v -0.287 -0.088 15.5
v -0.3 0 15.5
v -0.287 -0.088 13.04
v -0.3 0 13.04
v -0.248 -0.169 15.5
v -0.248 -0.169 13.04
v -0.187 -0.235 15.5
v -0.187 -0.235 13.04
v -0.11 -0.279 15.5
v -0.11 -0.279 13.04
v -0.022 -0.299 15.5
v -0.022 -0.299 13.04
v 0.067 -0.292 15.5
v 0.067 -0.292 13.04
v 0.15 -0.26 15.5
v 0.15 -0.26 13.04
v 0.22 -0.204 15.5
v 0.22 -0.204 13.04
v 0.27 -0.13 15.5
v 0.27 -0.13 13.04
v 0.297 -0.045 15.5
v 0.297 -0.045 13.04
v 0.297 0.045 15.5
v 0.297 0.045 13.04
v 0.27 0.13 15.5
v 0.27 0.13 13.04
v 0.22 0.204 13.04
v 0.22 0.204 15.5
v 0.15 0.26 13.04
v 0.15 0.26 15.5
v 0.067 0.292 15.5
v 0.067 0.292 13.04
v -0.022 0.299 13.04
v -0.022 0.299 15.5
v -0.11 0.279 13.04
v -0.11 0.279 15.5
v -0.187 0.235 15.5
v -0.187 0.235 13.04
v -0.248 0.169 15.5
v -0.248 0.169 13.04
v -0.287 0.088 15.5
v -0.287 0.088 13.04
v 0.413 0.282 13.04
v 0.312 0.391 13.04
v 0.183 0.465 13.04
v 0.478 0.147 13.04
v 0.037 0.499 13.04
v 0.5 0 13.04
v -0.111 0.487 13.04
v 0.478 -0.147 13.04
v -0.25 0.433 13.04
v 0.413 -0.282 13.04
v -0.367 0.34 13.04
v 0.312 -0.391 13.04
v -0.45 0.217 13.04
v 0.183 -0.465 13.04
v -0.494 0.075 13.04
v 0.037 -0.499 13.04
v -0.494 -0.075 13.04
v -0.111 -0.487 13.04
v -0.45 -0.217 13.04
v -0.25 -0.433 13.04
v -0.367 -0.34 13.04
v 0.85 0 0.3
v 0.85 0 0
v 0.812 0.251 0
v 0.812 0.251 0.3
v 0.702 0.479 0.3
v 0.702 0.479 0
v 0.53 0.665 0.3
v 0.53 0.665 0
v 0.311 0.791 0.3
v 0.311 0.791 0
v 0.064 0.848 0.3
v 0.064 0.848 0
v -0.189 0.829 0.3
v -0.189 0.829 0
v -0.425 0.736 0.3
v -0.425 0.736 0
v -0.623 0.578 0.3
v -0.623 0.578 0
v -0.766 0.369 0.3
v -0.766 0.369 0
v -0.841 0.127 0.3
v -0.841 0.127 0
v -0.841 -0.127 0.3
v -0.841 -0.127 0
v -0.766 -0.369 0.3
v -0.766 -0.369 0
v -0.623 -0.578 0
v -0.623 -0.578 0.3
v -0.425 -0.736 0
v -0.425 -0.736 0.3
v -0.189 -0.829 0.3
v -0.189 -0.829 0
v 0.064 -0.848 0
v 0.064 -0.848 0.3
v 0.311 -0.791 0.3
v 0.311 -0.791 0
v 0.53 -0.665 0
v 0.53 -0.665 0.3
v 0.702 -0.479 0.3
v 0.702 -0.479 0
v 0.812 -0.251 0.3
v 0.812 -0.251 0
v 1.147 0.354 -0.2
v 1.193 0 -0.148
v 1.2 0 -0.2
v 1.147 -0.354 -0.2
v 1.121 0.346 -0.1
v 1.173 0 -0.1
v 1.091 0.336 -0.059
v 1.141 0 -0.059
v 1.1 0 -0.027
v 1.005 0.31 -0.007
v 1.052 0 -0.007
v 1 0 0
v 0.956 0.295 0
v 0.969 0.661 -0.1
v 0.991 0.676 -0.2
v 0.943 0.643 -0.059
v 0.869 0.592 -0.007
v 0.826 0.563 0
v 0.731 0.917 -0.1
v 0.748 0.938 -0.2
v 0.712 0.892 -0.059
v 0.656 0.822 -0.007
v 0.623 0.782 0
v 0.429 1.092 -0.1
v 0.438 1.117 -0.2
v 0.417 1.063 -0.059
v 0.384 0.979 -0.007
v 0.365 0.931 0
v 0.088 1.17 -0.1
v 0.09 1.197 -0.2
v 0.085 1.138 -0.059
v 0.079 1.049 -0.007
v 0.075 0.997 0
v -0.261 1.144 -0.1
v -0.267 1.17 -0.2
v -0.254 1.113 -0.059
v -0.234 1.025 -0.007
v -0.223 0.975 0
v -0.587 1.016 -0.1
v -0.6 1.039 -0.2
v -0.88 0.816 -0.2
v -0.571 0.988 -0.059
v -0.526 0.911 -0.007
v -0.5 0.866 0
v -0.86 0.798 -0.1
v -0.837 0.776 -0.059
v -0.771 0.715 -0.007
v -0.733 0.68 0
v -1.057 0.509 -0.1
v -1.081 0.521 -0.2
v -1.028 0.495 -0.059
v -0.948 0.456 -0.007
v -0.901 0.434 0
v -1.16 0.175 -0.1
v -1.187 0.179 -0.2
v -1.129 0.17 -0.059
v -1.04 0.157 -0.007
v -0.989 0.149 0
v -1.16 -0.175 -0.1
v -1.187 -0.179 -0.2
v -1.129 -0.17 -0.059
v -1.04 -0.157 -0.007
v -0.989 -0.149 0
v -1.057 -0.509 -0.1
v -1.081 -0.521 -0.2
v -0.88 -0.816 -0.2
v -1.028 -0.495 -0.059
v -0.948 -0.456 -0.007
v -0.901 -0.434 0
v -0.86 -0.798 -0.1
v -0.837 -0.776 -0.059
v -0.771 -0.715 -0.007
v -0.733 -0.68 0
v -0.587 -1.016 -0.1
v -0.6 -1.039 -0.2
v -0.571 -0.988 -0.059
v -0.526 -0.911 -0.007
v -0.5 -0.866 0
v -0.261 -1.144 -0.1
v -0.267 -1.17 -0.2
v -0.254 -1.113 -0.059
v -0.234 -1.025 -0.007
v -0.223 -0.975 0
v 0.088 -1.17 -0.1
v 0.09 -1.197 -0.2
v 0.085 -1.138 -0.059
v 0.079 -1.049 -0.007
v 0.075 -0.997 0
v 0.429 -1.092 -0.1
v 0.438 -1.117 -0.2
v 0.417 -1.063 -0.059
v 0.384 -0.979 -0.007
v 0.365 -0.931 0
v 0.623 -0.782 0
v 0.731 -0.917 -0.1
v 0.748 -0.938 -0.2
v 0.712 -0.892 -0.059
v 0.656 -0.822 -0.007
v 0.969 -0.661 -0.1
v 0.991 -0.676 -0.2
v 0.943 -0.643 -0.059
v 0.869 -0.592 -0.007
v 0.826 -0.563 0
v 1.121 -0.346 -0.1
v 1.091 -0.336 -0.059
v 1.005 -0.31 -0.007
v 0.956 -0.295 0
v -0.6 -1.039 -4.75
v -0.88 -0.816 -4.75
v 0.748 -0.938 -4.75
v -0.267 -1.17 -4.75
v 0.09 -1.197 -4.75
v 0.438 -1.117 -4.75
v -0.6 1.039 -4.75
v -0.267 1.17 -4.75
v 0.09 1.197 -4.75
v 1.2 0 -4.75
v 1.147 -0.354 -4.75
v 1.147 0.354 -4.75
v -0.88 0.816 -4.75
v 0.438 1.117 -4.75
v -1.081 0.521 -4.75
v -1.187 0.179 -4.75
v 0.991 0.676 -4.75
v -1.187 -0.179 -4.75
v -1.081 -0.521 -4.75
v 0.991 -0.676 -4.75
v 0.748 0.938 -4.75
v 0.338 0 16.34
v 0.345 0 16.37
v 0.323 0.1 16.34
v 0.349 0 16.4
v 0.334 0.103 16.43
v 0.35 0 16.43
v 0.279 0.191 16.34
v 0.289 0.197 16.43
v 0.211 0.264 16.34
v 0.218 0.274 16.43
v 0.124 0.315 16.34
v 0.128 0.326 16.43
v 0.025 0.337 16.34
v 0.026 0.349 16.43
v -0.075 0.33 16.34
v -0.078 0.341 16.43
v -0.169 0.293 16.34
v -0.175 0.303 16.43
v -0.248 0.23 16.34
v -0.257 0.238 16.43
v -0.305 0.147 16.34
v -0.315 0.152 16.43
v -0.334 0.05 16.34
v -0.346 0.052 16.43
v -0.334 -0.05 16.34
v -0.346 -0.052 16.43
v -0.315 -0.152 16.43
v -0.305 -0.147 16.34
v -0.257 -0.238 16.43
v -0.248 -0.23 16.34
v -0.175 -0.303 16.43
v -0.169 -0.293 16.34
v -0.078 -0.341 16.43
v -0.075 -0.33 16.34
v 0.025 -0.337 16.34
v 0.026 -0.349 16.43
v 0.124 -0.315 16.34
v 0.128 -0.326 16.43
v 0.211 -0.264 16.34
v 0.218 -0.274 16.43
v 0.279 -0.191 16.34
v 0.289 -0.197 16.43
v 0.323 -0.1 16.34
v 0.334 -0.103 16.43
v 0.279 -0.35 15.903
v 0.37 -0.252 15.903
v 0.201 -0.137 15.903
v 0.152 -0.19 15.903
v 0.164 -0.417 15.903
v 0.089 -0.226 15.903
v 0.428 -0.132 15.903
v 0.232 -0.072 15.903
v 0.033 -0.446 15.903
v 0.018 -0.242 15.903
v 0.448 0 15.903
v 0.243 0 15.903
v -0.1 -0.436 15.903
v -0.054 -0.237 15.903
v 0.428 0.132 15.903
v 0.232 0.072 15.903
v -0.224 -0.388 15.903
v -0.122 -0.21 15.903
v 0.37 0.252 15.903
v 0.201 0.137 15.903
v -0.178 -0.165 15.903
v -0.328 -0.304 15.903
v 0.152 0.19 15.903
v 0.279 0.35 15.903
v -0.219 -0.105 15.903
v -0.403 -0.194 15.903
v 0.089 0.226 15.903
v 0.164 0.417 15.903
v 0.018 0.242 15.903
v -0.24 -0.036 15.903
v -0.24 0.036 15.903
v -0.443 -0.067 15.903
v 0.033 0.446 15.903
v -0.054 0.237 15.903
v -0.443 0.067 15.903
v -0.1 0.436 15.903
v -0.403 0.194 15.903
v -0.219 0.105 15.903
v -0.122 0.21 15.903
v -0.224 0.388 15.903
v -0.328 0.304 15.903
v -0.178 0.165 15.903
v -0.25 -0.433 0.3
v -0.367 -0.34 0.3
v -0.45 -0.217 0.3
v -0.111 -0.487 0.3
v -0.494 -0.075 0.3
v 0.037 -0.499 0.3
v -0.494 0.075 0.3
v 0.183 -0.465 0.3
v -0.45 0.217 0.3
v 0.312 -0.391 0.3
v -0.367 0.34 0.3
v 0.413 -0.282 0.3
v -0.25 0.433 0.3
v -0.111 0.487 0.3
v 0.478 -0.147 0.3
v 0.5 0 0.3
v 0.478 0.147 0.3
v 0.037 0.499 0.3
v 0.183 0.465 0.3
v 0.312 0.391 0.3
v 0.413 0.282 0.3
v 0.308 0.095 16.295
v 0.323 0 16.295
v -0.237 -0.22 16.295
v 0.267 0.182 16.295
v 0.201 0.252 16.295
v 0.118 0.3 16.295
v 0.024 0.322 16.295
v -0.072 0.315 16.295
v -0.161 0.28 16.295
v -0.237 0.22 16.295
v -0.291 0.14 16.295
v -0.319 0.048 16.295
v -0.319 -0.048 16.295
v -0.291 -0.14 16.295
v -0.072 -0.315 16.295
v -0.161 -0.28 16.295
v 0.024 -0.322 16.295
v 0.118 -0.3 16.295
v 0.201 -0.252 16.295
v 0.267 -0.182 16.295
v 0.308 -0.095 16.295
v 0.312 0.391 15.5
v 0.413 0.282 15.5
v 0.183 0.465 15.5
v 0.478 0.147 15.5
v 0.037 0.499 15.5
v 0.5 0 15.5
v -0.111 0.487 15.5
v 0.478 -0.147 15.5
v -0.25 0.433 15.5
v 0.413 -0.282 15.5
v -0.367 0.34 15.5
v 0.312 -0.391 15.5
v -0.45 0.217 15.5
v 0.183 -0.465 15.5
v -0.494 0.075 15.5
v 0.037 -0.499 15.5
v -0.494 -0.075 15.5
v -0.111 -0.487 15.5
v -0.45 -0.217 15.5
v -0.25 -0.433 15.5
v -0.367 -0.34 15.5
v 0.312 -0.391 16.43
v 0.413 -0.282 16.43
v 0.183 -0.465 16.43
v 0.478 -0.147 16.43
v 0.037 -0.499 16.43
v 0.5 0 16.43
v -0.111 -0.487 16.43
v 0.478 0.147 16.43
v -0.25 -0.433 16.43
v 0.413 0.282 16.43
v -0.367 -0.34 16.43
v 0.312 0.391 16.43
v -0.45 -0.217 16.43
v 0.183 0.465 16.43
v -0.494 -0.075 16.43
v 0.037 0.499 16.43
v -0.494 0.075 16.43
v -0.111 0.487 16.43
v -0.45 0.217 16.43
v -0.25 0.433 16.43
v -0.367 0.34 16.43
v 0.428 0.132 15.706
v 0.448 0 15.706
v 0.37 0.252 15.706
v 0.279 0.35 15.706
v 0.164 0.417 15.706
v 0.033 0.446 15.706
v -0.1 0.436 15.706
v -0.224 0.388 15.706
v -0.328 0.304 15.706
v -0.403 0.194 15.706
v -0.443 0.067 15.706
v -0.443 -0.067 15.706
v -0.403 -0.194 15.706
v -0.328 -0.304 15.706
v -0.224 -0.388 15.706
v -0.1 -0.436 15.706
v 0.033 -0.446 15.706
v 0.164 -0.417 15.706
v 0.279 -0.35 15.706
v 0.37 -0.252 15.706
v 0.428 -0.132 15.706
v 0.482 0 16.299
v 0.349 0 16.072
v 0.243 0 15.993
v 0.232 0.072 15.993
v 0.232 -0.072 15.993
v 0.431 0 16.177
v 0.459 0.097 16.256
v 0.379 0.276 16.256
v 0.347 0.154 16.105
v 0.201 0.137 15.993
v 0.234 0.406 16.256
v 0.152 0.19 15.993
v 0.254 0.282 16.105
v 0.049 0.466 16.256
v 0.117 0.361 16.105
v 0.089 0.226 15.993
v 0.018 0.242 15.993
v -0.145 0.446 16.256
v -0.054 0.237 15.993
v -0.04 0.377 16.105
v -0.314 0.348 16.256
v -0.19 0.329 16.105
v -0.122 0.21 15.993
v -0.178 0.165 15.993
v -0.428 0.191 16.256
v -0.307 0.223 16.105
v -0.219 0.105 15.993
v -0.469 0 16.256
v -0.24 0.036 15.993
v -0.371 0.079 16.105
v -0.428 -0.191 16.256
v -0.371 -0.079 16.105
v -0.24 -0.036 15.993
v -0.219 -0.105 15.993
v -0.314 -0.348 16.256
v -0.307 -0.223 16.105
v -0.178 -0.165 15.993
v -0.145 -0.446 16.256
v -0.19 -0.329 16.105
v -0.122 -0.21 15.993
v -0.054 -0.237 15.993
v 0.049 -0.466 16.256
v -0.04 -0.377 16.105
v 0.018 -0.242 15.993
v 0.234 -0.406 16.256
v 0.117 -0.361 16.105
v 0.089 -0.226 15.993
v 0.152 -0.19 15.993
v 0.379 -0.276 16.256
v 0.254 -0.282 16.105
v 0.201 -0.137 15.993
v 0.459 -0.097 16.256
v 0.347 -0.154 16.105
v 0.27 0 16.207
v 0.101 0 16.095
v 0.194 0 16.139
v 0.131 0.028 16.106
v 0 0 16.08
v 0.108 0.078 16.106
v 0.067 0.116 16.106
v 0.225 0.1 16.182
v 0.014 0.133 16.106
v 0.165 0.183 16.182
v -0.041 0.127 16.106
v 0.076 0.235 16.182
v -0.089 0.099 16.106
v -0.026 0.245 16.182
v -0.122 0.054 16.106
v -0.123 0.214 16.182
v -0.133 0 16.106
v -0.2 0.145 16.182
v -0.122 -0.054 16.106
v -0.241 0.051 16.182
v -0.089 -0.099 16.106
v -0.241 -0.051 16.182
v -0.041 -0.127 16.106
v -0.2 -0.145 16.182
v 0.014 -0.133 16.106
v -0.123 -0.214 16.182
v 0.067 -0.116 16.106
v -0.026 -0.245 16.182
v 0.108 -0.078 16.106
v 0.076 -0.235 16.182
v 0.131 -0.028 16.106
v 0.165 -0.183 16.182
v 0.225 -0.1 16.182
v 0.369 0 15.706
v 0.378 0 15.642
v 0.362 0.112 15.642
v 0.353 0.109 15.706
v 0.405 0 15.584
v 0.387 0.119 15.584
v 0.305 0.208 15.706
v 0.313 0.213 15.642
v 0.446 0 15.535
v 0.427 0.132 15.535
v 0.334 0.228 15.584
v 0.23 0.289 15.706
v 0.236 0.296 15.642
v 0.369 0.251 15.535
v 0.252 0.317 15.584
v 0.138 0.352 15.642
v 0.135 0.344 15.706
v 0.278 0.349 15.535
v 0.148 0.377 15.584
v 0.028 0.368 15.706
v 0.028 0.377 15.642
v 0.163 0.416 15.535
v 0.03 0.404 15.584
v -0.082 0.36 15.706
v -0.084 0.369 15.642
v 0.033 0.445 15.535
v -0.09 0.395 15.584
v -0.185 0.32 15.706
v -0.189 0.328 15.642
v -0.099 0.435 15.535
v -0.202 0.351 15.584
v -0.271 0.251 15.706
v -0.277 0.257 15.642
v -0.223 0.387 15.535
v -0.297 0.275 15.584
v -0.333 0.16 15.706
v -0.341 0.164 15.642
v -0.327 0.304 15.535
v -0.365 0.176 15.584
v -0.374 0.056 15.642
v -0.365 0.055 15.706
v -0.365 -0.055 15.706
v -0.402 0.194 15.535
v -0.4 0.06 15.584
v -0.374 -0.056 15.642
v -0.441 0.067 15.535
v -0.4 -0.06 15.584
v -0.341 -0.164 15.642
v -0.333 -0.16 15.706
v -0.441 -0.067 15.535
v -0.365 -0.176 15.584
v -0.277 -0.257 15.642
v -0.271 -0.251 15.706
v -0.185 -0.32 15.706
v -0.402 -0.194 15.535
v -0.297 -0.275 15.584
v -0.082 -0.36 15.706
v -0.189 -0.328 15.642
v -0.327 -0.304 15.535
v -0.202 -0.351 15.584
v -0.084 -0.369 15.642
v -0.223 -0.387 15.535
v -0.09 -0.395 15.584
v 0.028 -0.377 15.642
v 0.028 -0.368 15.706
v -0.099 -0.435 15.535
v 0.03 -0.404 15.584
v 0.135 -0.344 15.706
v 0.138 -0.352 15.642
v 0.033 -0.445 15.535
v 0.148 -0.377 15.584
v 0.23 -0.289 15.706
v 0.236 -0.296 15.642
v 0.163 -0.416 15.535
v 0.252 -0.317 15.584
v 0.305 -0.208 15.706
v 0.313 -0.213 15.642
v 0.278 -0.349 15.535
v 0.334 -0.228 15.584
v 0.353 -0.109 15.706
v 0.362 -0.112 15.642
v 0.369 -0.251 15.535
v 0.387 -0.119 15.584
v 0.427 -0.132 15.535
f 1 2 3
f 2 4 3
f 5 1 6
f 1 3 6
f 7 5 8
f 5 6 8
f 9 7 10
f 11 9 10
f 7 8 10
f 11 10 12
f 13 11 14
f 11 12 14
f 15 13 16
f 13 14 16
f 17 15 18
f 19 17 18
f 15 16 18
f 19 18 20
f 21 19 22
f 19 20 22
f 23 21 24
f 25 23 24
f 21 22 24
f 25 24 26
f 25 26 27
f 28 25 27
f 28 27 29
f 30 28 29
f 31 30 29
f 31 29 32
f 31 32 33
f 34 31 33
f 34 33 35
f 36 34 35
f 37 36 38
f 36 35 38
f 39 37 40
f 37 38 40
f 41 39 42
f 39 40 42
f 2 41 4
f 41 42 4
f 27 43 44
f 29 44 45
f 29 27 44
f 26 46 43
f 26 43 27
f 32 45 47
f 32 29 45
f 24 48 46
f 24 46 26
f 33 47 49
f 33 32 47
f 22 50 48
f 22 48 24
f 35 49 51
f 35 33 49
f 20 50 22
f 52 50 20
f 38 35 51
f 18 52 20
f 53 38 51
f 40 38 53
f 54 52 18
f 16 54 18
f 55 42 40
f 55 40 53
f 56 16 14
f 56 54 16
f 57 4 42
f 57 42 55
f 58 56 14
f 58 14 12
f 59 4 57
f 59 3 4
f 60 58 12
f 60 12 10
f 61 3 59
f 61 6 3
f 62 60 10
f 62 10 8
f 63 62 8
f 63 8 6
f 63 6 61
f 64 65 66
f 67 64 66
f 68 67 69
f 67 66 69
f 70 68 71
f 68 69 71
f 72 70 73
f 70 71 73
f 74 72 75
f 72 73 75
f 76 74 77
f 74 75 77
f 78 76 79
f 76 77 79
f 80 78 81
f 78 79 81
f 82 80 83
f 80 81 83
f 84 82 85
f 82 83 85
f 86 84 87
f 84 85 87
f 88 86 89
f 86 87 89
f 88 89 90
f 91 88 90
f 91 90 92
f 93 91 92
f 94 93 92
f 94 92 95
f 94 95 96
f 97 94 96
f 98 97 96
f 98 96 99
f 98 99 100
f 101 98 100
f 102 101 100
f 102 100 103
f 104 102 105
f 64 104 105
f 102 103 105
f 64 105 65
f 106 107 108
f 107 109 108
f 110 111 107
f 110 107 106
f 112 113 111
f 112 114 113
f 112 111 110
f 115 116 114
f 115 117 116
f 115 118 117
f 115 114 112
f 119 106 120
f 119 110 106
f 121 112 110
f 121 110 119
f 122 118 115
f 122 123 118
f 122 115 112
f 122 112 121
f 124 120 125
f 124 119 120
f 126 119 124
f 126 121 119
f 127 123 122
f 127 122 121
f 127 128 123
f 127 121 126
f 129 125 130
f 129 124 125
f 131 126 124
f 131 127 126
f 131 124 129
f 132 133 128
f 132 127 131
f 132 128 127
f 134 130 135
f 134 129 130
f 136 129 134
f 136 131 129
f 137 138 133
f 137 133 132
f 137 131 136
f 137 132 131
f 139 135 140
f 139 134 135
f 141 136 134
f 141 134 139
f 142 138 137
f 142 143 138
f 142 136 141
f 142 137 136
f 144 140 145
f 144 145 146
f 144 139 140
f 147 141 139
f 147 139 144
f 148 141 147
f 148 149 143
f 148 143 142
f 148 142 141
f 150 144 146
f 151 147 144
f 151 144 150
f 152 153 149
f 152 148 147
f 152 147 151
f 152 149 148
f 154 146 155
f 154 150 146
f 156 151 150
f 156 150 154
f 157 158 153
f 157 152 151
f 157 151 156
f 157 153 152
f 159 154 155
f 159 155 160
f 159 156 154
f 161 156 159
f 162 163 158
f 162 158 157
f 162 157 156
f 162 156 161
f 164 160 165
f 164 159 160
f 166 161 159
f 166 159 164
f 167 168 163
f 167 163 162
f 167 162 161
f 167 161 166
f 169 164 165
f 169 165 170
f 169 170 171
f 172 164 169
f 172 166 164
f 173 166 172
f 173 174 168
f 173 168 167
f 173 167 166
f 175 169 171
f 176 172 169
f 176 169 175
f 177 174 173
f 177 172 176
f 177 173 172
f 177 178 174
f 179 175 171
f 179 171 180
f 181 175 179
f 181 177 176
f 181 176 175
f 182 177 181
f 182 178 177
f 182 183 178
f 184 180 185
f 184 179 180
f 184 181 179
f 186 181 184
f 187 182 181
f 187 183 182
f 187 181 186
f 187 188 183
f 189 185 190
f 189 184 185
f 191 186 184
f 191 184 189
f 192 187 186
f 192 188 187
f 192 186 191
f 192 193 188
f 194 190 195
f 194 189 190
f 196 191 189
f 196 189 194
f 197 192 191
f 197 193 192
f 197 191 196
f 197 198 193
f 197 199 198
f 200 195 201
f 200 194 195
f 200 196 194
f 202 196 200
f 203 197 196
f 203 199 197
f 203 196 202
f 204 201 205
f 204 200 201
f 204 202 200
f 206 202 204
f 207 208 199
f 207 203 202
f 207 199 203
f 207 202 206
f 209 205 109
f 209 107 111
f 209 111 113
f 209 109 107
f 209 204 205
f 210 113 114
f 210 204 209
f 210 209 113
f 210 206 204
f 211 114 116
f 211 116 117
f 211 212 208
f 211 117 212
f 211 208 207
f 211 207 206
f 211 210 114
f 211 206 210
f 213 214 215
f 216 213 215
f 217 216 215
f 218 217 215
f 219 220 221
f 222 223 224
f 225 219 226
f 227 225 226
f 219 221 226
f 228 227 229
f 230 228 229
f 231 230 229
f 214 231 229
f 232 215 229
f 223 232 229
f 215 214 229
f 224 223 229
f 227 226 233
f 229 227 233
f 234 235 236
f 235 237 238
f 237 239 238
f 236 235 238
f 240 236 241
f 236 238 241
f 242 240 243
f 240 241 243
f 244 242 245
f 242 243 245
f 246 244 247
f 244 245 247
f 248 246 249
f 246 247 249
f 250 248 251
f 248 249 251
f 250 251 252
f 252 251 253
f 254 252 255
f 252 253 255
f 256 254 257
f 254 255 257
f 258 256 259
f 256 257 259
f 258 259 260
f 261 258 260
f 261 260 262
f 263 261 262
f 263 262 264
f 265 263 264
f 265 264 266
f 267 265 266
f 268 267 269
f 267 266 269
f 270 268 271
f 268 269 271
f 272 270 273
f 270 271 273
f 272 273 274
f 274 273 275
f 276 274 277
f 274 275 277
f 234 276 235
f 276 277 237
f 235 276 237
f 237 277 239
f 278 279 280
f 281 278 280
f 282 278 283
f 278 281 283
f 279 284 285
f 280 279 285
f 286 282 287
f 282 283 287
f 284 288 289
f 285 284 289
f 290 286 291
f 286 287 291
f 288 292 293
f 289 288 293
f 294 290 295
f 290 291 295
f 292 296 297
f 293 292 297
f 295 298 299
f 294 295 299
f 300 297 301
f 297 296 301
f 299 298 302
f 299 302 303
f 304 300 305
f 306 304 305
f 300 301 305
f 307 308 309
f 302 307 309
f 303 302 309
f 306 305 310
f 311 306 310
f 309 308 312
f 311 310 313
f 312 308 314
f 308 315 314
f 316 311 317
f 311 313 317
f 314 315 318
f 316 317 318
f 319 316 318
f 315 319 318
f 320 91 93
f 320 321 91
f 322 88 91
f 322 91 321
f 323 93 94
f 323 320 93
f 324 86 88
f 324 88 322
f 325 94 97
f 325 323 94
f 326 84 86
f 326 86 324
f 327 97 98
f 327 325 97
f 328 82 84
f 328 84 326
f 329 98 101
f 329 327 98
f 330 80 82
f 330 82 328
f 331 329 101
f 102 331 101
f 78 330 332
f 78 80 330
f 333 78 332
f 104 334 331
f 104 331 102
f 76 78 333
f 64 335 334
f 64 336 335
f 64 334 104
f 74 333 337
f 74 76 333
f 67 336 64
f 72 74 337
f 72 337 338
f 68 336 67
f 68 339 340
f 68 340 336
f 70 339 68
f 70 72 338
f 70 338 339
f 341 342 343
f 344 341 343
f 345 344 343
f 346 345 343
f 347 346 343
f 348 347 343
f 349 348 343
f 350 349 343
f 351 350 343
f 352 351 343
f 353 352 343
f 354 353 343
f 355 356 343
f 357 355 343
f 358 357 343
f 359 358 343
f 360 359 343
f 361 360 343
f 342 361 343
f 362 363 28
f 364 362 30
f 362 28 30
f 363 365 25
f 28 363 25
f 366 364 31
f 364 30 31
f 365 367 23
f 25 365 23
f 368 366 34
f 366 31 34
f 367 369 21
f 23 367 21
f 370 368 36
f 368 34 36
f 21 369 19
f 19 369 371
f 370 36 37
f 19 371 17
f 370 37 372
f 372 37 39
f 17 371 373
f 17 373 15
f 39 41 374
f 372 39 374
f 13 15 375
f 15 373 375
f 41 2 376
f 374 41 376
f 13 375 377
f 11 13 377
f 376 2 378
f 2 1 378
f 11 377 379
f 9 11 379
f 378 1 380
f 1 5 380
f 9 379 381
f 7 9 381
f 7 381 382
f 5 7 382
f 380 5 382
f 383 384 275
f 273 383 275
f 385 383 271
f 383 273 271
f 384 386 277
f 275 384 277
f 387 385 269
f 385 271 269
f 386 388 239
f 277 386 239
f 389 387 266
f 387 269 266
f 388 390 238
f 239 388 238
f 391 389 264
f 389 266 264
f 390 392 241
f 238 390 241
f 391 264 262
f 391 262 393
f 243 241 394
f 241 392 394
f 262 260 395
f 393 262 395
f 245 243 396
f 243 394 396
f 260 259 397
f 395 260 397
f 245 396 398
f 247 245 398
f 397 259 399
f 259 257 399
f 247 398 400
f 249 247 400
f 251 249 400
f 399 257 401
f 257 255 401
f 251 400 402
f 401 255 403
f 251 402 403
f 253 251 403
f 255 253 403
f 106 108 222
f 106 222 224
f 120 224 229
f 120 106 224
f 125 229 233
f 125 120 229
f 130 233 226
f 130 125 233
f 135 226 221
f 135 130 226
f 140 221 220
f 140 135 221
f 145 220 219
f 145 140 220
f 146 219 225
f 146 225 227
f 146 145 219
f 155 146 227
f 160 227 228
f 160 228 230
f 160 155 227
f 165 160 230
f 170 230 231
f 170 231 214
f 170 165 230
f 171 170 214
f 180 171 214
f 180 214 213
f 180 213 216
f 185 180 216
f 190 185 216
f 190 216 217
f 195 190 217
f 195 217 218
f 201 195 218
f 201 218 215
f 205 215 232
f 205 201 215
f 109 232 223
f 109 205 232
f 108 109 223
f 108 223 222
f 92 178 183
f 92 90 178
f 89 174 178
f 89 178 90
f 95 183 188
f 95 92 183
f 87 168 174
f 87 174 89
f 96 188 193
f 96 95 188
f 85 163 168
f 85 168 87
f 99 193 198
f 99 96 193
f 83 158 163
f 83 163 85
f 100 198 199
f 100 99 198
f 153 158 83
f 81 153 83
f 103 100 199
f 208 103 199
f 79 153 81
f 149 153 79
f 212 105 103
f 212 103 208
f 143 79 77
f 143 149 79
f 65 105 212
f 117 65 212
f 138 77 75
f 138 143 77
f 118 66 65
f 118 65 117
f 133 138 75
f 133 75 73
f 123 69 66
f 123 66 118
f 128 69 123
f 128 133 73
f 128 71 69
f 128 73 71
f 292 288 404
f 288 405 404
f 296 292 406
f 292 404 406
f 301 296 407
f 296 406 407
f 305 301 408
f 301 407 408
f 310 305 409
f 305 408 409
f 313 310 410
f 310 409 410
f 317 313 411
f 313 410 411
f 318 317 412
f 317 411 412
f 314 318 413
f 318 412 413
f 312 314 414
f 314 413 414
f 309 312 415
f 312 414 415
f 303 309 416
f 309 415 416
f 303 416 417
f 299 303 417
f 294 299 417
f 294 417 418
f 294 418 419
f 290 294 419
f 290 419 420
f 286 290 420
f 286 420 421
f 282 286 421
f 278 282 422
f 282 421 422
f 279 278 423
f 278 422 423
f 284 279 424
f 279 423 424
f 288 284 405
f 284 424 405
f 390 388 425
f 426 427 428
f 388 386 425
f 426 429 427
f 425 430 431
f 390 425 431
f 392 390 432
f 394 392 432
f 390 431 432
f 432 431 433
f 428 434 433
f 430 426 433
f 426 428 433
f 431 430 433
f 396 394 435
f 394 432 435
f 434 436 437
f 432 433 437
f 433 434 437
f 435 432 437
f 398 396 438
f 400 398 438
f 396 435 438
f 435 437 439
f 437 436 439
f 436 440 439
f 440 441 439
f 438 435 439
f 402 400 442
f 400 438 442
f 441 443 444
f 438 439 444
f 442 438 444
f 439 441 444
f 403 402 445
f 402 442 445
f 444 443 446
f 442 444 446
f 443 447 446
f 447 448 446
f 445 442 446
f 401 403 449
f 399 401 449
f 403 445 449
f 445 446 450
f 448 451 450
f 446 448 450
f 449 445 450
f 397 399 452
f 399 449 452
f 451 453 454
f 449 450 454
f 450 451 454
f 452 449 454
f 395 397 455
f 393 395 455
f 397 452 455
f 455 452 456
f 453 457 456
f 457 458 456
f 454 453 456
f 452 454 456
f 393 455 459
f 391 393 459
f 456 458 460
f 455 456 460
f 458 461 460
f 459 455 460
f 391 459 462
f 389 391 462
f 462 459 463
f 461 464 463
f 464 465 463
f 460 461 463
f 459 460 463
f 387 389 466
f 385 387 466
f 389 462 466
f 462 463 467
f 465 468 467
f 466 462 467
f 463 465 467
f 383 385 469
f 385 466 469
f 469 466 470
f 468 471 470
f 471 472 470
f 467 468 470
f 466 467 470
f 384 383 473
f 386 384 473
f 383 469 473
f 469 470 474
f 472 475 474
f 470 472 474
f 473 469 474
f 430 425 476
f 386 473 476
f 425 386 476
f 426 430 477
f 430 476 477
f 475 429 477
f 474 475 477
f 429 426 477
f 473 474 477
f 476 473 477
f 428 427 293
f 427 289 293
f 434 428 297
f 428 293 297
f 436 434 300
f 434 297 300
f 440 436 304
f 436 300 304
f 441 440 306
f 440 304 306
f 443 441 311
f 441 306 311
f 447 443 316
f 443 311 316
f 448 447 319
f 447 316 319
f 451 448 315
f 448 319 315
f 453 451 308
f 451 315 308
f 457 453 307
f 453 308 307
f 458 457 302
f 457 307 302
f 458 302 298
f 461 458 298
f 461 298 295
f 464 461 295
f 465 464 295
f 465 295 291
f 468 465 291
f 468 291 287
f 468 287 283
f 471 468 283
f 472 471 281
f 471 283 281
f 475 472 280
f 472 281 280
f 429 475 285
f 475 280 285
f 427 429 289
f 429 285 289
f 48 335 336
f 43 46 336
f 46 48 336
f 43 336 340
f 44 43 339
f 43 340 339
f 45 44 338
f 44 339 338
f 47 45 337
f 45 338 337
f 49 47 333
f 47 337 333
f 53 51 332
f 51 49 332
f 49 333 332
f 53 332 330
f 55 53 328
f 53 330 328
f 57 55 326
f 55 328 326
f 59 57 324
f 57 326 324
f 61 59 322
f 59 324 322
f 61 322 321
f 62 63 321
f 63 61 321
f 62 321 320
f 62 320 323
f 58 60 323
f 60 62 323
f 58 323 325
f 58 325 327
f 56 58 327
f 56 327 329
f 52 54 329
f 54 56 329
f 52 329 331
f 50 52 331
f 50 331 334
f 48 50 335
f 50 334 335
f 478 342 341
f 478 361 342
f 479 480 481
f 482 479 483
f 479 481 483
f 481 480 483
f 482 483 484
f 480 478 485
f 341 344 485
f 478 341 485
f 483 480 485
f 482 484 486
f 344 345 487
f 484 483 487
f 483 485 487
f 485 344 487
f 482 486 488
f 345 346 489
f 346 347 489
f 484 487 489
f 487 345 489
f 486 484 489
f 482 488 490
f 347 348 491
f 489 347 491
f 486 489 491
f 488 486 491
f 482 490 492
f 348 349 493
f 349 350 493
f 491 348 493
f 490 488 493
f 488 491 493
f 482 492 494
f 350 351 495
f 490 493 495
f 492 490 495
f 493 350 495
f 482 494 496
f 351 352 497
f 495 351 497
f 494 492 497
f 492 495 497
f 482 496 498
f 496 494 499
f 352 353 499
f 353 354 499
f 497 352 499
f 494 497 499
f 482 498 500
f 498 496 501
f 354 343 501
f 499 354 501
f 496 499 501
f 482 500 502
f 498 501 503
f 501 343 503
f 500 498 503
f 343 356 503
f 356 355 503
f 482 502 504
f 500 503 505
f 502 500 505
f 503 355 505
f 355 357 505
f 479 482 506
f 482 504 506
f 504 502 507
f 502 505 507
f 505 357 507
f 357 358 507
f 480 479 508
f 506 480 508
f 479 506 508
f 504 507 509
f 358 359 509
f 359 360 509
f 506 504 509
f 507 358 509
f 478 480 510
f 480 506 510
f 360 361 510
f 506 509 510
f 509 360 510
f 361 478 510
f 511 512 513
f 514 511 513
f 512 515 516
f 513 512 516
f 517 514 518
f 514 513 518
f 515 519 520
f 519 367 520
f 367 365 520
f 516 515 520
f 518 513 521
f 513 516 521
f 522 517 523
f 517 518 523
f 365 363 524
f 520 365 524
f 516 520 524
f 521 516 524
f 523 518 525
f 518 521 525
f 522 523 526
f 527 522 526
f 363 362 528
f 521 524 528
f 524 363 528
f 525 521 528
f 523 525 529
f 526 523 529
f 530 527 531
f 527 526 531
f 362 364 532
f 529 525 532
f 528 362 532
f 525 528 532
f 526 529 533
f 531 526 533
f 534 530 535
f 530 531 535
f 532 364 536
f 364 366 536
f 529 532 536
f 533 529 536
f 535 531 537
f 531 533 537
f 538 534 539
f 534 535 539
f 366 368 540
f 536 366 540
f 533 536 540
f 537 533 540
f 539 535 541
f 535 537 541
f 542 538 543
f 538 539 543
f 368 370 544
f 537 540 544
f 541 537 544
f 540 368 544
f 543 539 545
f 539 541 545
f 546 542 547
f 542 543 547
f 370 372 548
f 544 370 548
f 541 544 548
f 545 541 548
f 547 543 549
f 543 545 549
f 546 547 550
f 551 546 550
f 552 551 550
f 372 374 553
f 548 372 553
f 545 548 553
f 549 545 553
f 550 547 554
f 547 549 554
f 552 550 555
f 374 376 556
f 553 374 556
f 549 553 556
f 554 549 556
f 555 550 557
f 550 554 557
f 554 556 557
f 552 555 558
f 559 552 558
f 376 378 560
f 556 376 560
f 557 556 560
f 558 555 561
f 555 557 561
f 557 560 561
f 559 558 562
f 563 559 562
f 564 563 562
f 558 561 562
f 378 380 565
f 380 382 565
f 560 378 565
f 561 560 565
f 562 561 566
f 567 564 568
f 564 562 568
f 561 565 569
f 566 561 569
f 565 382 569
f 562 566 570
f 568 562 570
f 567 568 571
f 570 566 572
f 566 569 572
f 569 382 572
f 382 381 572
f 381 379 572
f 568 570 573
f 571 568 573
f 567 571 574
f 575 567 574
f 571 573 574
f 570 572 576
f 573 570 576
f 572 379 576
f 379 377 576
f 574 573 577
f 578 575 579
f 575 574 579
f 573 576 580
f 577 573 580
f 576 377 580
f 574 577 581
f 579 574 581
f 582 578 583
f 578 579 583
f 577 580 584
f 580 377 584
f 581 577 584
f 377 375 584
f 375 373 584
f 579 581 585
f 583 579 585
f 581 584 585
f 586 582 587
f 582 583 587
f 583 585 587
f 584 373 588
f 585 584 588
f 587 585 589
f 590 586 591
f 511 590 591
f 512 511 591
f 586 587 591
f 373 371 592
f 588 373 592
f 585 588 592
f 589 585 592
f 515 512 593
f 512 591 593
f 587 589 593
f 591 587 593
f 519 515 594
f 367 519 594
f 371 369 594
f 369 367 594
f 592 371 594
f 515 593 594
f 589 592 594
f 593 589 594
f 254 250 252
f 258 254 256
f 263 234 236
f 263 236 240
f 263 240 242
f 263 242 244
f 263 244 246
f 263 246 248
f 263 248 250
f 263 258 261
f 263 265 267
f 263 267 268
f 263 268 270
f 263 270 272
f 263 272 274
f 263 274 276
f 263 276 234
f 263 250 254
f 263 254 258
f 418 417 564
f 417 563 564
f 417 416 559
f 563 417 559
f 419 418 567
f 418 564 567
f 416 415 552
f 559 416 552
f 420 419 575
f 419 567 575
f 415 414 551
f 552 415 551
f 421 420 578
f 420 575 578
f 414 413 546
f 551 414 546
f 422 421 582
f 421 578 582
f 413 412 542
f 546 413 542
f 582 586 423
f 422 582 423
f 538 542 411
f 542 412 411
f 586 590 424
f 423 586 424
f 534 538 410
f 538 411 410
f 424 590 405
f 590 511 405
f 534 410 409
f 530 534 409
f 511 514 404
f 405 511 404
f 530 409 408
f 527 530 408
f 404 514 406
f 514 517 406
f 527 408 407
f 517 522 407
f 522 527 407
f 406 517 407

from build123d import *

# Parameters (mm, degrees)
SKETCH1_R           = 0.5
BOSS_EXTRUDE1_DEPTH = 15.5
SKETCH1_3_R         = 1.2
BOSS_EXTRUDE2_DEPTH = 4.75
FILLET1_R           = 0.2
SKETCH2_R           = 0.85
BOSS_EXTRUDE3_DEPTH = 0.3
SKETCH4_W           = 0.461524445
SKETCH4_H           = 0.045344169
SKETCH7_W           = 0.600727217
SKETCH7_H           = 2.46


with BuildPart() as part:
    # Sketch1 → Boss-Extrude1 (new body)
    with BuildSketch(Plane.XY):
        Circle(SKETCH1_R)
    extrude(amount=BOSS_EXTRUDE1_DEPTH)



with BuildPart() as body_2:
    # Sketch1<3> → Boss-Extrude2 (new body)
    with BuildSketch(Plane.XY):
        Circle(SKETCH1_3_R)
    extrude(amount=-BOSS_EXTRUDE2_DEPTH)

    # Fillet1
    fillet1_edges = [body_2.edges().sort_by_distance(p)[0] for p in [
        (-1.2, 0, 0),
    ]]
    fillet(fillet1_edges, radius=FILLET1_R)


with BuildPart() as part_1:
    add(part.part)

    add(body_2.part)  # Boss-Extrude3 merges body 2
    # Sketch2 → Boss-Extrude3 (add)
    with BuildSketch(Plane.XY):
        Circle(SKETCH2_R)
    extrude(amount=BOSS_EXTRUDE3_DEPTH)

    # Sketch3 → Revolve1 (revolve)
    with BuildSketch(Plane(origin=(0, 0, 0), x_dir=(1, 0, 0), z_dir=(0, 1, 0))):
        with BuildLine():
            Line((0.5, -15.5), (0, -15.5))
            Line((0, -15.5), (0, -16.08))
            ThreePointArc((0, -16.08), (0.247487373, -16.182512627), (0.35, -16.43))
            Line((0.35, -16.43), (0.5, -16.43))
            ThreePointArc((0.5, -16.43), (0.430997893, -16.176542279), (0.243036734, -15.993041025))
            Line((0.243036734, -15.993041025), (0.243036734, -15.903342272))
            Line((0.243036734, -15.903342272), (0.447644951, -15.903342272))
            Line((0.447644951, -15.903342272), (0.447644951, -15.705896244))
            Line((0.447644951, -15.705896244), (0.36945341, -15.705896244))
            ThreePointArc((0.36945341, -15.705896244), (0.404840541, -15.583999079), (0.5, -15.5))
        make_face()
    revolve(axis=Axis((0, 0, 15.5), (0, 0, 1)))

    # Sketch4 → Revolve2 (revolve)
    with BuildSketch(Plane(origin=(0, 0, 0), x_dir=(1, 0, 0), z_dir=(0, 1, 0))):
        with Locations((-0.230762223, -16.317327916)):
            Rectangle(SKETCH4_W, SKETCH4_H)
    revolve(axis=Axis((0, 0, 15.5), (0, 0, 1)))

    # Sketch7 → Cut-Revolve1 (revolve, cut)
    with BuildSketch(Plane(origin=(0, 0, 0), x_dir=(1, 0, 0), z_dir=(0, 1, 0))):
        with Locations((-0.600363609, -14.27)):
            Rectangle(SKETCH7_W, SKETCH7_H)
    revolve(axis=Axis((0, 0, 15.5), (0, 0, 1)), mode=Mode.SUBTRACT)


solid = part_1.part
